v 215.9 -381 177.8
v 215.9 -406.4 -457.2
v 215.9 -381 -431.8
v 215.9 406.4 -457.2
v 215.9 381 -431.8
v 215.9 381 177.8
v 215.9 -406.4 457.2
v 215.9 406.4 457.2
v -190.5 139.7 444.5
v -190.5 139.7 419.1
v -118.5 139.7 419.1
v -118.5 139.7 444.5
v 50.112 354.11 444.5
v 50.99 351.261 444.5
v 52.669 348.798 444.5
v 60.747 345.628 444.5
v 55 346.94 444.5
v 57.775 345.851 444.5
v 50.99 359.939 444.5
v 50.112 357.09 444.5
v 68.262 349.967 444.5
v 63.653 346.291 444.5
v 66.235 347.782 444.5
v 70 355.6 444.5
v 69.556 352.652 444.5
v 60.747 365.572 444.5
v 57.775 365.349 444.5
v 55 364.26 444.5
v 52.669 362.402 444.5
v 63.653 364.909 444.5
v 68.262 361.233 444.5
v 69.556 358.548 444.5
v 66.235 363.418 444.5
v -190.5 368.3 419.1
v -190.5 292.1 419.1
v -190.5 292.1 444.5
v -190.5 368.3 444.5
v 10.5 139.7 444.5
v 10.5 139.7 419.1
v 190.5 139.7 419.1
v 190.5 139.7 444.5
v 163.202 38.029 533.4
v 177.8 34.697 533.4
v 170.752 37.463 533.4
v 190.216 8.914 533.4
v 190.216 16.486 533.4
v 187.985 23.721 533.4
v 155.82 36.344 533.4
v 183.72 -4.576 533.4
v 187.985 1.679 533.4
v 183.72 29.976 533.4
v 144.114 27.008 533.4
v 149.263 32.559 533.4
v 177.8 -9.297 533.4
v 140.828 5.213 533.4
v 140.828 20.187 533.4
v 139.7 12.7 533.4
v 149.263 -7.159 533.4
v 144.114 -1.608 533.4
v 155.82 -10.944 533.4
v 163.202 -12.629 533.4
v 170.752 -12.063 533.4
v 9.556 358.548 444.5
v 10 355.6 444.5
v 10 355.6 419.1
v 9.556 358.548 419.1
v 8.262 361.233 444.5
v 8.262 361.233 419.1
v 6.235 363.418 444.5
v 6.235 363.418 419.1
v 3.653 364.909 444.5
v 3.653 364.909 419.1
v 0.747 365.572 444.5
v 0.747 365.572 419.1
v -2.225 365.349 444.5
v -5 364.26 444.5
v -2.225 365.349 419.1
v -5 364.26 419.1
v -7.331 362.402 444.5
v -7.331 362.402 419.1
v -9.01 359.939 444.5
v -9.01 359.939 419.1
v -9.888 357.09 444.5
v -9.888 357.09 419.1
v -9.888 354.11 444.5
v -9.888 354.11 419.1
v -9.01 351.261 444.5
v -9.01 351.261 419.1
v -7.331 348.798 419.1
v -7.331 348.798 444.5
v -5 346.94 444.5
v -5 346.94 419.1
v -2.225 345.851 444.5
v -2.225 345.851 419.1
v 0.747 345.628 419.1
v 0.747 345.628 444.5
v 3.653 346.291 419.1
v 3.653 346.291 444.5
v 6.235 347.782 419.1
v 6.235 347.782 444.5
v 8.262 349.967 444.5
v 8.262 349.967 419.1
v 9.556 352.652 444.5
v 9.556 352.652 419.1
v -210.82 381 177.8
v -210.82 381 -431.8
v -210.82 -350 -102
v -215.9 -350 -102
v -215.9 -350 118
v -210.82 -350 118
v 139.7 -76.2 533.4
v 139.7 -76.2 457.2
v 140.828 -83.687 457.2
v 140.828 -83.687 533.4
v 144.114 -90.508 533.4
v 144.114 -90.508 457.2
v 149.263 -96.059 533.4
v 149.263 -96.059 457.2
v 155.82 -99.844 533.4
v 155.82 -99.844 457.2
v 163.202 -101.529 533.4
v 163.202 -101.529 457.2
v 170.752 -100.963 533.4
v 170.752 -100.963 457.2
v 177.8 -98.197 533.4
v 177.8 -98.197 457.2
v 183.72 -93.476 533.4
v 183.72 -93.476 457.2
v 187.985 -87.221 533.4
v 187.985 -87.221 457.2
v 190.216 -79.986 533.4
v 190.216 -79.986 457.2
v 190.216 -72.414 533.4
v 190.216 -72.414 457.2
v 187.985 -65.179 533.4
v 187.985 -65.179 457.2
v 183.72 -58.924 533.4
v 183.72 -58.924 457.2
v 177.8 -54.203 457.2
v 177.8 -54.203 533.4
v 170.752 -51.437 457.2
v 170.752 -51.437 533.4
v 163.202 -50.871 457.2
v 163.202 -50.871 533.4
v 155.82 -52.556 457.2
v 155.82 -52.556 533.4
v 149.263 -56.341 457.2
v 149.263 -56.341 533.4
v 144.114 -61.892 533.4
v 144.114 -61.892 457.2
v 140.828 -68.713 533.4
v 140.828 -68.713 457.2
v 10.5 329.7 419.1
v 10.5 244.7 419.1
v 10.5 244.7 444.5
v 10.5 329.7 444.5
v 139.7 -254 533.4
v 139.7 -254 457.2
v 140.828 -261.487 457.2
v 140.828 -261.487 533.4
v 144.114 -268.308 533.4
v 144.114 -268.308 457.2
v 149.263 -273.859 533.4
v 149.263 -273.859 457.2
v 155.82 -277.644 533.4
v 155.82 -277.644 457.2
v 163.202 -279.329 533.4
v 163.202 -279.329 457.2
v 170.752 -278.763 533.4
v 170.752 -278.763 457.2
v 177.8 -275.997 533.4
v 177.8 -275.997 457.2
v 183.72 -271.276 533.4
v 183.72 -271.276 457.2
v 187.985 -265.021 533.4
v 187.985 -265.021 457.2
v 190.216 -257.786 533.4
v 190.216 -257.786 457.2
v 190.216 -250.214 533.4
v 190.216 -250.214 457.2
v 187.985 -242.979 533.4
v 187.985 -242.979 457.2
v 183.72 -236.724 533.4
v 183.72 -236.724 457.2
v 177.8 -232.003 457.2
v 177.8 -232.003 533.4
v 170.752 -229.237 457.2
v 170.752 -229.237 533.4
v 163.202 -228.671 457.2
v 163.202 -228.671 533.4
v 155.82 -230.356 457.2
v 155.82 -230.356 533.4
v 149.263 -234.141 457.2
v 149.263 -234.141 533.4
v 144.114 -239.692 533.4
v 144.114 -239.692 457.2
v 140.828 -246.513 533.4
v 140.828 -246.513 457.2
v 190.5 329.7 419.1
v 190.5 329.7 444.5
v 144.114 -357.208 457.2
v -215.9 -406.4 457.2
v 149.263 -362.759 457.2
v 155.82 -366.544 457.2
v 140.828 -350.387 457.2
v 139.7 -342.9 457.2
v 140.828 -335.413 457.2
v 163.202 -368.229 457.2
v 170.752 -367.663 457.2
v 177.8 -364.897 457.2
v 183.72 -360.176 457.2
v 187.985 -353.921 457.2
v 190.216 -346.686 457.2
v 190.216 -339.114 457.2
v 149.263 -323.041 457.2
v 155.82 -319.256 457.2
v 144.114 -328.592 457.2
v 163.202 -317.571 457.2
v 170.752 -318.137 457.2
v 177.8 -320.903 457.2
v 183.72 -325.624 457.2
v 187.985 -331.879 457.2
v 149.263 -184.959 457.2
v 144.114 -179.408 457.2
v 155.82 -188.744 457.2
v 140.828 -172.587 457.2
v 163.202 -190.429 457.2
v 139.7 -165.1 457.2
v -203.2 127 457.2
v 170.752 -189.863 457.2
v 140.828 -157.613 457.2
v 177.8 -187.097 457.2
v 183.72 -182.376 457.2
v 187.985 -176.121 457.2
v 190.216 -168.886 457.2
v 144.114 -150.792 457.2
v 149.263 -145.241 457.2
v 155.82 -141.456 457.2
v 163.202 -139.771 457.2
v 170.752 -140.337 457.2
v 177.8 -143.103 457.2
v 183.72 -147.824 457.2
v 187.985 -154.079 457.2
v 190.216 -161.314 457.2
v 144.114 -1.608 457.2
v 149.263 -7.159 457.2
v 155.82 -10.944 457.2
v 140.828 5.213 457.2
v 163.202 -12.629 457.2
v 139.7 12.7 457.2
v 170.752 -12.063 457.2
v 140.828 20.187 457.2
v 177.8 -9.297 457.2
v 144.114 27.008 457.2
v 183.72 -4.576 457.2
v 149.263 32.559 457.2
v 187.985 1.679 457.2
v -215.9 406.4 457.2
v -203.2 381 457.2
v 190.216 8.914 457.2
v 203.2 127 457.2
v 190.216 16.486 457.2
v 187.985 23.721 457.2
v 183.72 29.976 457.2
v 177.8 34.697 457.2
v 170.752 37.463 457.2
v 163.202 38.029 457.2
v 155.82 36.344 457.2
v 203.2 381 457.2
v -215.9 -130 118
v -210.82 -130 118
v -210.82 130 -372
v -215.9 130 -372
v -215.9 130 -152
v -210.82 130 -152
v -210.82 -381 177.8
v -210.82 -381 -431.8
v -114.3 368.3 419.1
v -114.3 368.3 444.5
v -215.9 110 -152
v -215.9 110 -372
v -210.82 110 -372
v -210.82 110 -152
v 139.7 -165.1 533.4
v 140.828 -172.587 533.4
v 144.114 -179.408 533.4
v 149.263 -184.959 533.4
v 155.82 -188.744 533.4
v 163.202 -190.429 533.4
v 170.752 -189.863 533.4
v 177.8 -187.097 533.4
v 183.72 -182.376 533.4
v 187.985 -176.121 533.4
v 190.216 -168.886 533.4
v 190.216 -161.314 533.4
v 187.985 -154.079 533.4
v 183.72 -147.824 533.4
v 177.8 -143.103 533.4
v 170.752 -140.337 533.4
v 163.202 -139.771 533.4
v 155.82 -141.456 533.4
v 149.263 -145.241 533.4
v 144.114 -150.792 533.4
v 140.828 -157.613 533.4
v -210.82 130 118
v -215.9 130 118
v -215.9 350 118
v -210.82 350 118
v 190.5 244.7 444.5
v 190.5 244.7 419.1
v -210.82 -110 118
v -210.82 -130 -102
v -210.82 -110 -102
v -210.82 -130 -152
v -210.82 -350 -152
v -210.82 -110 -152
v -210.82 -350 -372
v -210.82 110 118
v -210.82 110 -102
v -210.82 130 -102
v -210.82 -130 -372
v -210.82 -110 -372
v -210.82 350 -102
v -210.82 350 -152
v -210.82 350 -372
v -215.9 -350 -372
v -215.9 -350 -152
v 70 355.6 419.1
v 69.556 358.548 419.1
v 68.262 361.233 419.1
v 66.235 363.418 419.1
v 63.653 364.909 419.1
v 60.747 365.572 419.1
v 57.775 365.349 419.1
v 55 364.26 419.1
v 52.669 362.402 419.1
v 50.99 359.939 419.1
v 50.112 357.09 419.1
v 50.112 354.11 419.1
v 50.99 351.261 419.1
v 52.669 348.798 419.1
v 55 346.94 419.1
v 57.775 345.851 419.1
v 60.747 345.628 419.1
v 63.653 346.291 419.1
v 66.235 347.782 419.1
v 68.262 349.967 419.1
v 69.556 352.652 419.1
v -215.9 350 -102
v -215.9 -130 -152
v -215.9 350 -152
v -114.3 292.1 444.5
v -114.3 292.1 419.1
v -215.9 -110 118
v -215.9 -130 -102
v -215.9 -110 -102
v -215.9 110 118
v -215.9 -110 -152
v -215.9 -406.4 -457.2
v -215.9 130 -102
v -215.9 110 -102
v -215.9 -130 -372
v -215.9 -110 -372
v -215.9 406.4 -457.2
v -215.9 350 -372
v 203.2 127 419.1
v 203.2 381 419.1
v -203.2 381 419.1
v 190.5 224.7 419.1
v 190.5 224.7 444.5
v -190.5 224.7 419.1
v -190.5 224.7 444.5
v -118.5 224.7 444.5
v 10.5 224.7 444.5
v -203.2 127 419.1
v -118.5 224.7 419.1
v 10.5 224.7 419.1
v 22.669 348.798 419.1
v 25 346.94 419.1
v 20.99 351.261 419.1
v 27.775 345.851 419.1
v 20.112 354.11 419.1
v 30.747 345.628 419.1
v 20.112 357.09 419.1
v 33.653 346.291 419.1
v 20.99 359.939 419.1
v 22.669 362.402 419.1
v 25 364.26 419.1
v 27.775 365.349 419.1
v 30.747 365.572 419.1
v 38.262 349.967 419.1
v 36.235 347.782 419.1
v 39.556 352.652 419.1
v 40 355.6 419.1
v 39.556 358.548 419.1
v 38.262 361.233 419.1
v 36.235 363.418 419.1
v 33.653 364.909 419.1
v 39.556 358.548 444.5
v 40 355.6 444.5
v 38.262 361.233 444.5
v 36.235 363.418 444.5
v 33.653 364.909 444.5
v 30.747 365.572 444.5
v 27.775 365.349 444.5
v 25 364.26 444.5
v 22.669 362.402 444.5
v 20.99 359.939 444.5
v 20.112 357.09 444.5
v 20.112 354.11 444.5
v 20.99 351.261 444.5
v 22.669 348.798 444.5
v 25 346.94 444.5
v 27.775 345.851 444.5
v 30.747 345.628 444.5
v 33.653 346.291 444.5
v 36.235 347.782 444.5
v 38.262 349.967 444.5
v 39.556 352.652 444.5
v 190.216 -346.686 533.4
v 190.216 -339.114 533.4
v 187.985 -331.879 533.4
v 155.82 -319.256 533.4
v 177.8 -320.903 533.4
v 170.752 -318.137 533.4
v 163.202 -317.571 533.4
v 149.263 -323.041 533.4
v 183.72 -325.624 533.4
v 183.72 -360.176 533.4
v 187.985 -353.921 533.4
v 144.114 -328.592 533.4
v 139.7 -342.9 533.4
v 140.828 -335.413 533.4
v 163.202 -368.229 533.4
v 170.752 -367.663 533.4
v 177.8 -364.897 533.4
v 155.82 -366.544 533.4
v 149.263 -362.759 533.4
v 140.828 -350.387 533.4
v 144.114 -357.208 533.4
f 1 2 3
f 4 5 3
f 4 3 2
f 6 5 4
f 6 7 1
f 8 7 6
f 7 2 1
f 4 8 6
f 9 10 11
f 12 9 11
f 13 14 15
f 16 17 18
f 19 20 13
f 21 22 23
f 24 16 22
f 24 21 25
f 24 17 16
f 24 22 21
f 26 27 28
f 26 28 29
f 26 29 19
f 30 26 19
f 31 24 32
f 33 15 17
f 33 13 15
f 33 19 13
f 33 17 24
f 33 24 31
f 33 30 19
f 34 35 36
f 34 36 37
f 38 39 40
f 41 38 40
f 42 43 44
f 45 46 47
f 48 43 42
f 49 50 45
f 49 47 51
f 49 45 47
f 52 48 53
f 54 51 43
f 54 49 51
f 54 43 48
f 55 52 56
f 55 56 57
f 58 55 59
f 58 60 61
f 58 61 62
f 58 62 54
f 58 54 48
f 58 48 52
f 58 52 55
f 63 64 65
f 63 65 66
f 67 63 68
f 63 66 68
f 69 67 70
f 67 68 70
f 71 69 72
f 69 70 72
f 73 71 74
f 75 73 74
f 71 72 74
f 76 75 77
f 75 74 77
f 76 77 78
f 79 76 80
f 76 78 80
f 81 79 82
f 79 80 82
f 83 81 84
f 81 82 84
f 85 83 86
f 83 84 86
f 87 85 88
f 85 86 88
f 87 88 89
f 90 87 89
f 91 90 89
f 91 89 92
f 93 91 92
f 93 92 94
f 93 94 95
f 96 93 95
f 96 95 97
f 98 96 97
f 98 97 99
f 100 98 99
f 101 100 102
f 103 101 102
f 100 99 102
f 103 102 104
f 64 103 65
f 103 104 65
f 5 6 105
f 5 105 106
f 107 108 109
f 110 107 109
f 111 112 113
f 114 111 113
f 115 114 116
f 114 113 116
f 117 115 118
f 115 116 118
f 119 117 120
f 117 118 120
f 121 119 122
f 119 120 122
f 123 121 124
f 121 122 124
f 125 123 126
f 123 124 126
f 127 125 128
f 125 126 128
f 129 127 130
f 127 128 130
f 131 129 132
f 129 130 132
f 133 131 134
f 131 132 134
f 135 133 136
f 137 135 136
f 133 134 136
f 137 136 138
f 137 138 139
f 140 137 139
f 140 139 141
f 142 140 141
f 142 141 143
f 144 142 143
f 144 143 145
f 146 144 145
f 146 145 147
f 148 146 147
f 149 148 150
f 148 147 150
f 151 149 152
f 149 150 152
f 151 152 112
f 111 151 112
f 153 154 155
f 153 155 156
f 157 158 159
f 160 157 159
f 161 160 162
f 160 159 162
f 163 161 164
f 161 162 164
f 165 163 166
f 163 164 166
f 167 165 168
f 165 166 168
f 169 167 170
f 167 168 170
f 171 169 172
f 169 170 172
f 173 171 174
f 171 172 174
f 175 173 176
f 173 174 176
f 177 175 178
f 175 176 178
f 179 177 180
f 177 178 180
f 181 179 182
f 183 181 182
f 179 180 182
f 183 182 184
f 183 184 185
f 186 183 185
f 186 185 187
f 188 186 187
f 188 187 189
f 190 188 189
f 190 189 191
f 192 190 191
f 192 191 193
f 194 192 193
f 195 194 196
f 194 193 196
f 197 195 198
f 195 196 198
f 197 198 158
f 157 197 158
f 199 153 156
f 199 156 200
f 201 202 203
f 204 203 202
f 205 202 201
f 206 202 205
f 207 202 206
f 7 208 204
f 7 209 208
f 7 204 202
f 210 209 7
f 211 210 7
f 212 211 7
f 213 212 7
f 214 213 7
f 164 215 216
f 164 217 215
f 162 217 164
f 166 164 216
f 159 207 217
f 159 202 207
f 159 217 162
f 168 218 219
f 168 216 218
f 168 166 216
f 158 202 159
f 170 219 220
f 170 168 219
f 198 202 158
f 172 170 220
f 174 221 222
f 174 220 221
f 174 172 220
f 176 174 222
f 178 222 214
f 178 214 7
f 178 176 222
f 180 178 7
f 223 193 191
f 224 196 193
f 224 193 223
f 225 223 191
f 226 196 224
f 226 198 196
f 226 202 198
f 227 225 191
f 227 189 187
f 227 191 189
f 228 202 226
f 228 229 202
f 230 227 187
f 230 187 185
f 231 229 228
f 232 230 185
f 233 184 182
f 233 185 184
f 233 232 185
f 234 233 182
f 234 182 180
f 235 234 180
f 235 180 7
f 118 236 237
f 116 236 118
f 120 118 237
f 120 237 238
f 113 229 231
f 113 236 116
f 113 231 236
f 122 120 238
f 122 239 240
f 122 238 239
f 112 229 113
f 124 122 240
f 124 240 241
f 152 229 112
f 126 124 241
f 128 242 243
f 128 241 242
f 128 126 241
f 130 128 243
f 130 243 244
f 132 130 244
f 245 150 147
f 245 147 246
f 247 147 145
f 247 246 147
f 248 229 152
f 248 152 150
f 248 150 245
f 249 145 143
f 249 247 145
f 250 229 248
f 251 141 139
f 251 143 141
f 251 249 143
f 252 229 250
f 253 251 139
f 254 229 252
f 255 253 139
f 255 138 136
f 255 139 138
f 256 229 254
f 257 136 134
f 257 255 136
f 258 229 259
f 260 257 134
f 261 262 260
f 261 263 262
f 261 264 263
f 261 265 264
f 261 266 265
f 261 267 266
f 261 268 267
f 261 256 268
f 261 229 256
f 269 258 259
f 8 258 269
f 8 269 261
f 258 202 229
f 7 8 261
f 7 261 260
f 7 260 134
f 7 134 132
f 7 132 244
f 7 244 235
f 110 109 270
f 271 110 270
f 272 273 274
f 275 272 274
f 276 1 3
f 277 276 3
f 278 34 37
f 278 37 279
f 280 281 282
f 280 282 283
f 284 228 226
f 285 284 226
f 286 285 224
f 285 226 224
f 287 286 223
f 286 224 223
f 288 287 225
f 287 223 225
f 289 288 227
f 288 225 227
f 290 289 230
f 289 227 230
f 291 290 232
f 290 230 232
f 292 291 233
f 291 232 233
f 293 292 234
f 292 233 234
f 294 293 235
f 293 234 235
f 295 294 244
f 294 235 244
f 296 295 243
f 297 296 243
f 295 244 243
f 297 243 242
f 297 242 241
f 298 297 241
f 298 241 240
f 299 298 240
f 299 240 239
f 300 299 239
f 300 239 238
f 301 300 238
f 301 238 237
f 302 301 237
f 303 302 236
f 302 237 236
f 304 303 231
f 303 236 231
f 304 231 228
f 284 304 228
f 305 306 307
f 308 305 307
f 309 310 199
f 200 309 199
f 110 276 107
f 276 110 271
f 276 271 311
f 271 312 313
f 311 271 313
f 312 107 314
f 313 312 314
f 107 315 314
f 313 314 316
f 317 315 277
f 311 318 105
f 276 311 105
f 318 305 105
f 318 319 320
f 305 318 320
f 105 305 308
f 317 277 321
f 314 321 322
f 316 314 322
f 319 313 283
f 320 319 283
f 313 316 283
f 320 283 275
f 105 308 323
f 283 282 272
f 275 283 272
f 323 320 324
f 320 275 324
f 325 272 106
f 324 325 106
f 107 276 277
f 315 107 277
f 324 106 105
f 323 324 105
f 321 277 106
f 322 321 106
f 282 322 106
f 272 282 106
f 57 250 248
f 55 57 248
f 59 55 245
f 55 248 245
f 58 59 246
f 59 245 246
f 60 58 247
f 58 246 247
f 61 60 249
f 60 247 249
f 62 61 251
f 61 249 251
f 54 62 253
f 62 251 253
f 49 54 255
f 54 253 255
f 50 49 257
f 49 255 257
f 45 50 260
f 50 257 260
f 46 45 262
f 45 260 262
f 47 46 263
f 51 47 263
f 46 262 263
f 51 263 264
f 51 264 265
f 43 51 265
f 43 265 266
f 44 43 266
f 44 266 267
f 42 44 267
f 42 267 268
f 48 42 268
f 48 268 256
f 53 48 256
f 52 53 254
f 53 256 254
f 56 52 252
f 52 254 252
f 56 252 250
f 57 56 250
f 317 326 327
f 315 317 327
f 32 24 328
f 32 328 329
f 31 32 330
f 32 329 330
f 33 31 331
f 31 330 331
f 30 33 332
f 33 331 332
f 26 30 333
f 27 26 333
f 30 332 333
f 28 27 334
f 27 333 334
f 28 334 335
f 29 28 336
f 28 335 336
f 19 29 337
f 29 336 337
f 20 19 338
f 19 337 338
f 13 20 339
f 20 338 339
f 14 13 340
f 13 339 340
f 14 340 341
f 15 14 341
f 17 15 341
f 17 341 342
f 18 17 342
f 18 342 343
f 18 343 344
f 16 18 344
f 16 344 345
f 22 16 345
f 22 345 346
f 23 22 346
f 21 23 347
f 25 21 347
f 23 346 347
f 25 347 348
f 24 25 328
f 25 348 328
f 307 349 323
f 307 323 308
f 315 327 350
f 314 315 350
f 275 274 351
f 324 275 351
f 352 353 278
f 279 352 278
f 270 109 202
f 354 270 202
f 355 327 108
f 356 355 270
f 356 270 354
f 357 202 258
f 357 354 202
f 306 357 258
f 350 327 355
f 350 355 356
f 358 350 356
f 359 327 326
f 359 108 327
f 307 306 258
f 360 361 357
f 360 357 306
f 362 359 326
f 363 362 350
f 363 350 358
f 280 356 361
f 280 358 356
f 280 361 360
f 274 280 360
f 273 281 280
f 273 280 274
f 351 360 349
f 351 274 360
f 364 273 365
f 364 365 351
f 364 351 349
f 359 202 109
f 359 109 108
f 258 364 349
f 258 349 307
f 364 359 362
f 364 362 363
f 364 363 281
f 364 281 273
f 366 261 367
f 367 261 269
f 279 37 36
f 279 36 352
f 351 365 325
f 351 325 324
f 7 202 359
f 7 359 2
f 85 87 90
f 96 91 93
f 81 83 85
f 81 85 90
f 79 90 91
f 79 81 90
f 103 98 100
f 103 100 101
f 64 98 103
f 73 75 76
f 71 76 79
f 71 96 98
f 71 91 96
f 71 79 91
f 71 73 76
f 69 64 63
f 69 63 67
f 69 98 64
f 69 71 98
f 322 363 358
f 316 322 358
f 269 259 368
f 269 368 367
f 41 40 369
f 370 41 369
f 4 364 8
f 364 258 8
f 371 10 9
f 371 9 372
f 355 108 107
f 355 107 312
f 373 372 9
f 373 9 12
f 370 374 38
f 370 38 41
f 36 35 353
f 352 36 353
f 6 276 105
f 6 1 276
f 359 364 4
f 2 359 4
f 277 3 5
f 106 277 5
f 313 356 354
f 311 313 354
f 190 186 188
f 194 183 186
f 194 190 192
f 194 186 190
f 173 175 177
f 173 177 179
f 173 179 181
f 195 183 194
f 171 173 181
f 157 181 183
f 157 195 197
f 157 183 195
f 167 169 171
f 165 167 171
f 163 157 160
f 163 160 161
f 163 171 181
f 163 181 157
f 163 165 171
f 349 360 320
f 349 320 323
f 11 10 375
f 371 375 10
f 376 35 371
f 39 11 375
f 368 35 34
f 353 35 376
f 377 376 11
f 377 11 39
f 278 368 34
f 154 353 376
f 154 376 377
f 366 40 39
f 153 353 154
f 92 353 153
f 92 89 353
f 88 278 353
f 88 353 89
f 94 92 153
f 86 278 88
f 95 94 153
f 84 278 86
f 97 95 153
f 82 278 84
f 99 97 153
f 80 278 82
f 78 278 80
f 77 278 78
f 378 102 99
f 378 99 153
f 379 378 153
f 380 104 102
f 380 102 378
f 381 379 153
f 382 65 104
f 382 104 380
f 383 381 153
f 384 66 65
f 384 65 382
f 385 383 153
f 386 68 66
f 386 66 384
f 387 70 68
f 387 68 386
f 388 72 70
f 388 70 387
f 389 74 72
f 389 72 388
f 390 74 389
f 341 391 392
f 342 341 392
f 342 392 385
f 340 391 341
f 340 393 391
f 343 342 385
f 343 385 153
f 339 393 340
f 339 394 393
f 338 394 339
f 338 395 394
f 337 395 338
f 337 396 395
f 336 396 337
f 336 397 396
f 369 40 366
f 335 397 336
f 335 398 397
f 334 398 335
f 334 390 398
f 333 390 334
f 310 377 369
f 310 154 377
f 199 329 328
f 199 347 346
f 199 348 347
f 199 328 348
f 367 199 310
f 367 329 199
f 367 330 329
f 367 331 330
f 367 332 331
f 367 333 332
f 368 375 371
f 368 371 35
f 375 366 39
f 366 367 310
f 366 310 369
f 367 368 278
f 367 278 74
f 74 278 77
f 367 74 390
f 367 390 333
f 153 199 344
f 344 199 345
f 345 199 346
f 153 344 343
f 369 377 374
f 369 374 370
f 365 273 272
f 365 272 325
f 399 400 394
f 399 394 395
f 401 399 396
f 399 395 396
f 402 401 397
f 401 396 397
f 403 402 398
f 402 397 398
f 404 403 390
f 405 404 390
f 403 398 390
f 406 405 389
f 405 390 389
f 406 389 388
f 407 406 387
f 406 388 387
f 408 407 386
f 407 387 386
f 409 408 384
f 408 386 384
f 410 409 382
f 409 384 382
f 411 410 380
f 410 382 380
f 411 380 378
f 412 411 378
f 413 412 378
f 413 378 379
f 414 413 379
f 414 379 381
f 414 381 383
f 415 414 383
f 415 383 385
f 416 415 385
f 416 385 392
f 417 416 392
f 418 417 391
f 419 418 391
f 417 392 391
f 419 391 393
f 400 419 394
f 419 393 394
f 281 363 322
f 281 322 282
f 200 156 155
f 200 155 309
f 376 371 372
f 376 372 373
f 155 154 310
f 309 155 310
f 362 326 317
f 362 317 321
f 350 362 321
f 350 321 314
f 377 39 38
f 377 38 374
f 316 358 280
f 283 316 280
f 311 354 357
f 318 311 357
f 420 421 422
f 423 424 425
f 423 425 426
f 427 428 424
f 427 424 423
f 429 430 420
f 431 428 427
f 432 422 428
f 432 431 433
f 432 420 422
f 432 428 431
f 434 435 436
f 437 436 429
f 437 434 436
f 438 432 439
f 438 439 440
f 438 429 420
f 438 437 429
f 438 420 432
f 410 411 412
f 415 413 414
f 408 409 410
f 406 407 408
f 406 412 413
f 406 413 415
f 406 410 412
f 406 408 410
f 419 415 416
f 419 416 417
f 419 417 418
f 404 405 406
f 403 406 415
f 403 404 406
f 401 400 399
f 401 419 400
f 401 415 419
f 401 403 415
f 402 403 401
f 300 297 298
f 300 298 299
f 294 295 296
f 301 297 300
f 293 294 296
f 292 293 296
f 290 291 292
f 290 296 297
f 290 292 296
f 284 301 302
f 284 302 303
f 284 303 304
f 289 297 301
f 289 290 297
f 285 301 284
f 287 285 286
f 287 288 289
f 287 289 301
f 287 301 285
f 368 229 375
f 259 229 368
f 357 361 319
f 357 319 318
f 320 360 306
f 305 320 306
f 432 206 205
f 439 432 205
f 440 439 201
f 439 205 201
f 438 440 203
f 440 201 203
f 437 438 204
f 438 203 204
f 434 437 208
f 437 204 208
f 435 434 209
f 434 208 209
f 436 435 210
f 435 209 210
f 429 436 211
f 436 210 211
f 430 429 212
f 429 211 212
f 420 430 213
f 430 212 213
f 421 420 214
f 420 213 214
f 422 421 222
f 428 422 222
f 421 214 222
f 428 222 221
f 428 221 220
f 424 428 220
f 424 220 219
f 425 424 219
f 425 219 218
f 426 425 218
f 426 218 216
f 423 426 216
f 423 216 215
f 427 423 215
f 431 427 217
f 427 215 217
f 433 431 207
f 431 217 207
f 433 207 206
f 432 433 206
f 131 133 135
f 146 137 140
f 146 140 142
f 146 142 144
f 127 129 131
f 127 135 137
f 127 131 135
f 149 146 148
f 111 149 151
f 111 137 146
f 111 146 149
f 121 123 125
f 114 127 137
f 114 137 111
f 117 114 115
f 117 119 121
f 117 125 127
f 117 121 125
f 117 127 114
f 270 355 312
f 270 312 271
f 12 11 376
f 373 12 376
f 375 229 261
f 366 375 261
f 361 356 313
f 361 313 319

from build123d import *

# Parameters (mm, degrees)
SKETCH2_W           = 431.8
SKETCH2_H           = 812.8
BOSS_EXTRUDE1_DEPTH = 457.2
SKETCH3_W           = 406.4
SKETCH3_H           = 254
CUT_EXTRUDE1_DEPTH  = 38.1
SKETCH3_4_R         = 25.4
BOSS_EXTRUDE2_DEPTH = 76.2
SKETCH5_R           = 10
SKETCH5_W           = 76.2
SKETCH5_H           = 76.2
SKETCH5_W_2         = 180
SKETCH5_H_2         = 85
SKETCH5_W_3         = 72
BOSS_EXTRUDE3_DEPTH = 25.4
SKETCH6_W           = 609.6
SKETCH6_H           = 762
CUT_EXTRUDE2_DEPTH  = 798.57617818
SKETCH7_W           = 5.08
SKETCH7_H           = 762
BOSS_EXTRUDE4_DEPTH = 609.6
SKETCH8_W           = 609.6
SKETCH8_H           = 762
CUT_EXTRUDE3_DEPTH  = 798.57617818
SKETCH9_W           = 5.08
SKETCH9_H           = 762
BOSS_EXTRUDE5_DEPTH = 609.6
SKETCH10_W          = 220
SKETCH10_H          = 220
CUT_EXTRUDE5_DEPTH  = 25.4


with BuildPart() as part:
    # Sketch2 → Boss-Extrude1 (new, symmetric)
    with BuildSketch(Plane.XY):
        Rectangle(SKETCH2_W, SKETCH2_H)
    extrude(amount=BOSS_EXTRUDE1_DEPTH, both=True)

    # Sketch3 → Cut-Extrude1 (cut)
    with BuildSketch(Plane.XY.offset(457.2)):
        with Locations((0, 254)):
            Rectangle(SKETCH3_W, SKETCH3_H)
    extrude(amount=-CUT_EXTRUDE1_DEPTH, mode=Mode.SUBTRACT)

    # Sketch3<4> → Boss-Extrude2 (add)
    with BuildSketch(Plane.XY.offset(457.2)):
        with Locations(Location((165.1, -342.9, 0), (0, 0, 180))):
            Circle(SKETCH3_4_R)
        with Locations(Location((165.1, -254, 0), (0, 0, 180))):
            Circle(SKETCH3_4_R)
        with Locations(Location((165.1, -165.1, 0), (0, 0, 180))):
            Circle(SKETCH3_4_R)
        with Locations(Location((165.1, -76.2, 0), (0, 0, 180))):
            Circle(SKETCH3_4_R)
        with Locations(Location((165.1, 12.7, 0), (0, 0, 180))):
            Circle(SKETCH3_4_R)
    extrude(amount=BOSS_EXTRUDE2_DEPTH)

    # Sketch5 → Boss-Extrude3 (add)
    with BuildSketch(Plane.XY.offset(419.1)):
        with Locations((0, 355.6)):
            Circle(SKETCH5_R)
        with Locations((30, 355.6)):
            Circle(SKETCH5_R)
        with Locations((60, 355.6)):
            Circle(SKETCH5_R)
        with Locations((-152.4, 330.2)):
            Rectangle(SKETCH5_W, SKETCH5_H)
        with Locations((100.5, 182.2)):
            Rectangle(SKETCH5_W_2, SKETCH5_H_2)
        with Locations((100.5, 287.2)):
            Rectangle(SKETCH5_W_2, SKETCH5_H_2)
        with Locations((-154.5, 182.2)):
            Rectangle(SKETCH5_W_3, SKETCH5_H_2)
    extrude(amount=BOSS_EXTRUDE3_DEPTH)

    # Sketch6 → Cut-Extrude2 (cut, through all)
    with BuildSketch(Plane(origin=(215.9, 0, 0), x_dir=(0, 0, -1), z_dir=(1, 0, 0))):
        with Locations((127, 0)):
            Rectangle(SKETCH6_W, SKETCH6_H)
    extrude(amount=-CUT_EXTRUDE2_DEPTH, mode=Mode.SUBTRACT)

    # Sketch7 → Boss-Extrude4 (add)
    with BuildSketch(Plane.XY.offset(-431.8)):
        with Locations((213.36, 0)):
            Rectangle(SKETCH7_W, SKETCH7_H)
    extrude(amount=BOSS_EXTRUDE4_DEPTH)

    # Sketch8 → Cut-Extrude3 (cut, through all)
    with BuildSketch(Plane(origin=(215.9, 0, 0), x_dir=(0, 0, -1), z_dir=(1, 0, 0))):
        with Locations((127, 0)):
            Rectangle(SKETCH8_W, SKETCH8_H)
    extrude(amount=-CUT_EXTRUDE3_DEPTH, mode=Mode.SUBTRACT)

    # Sketch9 → Boss-Extrude5 (add)
    with BuildSketch(Plane.XY.offset(-431.8)):
        with Locations((-213.36, 0)):
            Rectangle(SKETCH9_W, SKETCH9_H)
    extrude(amount=BOSS_EXTRUDE5_DEPTH)

    # Sketch10 → Cut-Extrude5 (cut)
    with BuildSketch(Plane.ZY.offset(215.9)):
        with Locations((-262, 240)):
            Rectangle(SKETCH10_W, SKETCH10_H)
        with Locations((-262, 0)):
            Rectangle(SKETCH10_W, SKETCH10_H)
        with Locations((-262, -240)):
            Rectangle(SKETCH10_W, SKETCH10_H)
        with Locations((8, -240)):
            Rectangle(SKETCH10_W, SKETCH10_H)
        with Locations((8, 240)):
            Rectangle(SKETCH10_W, SKETCH10_H)
        with Locations((8, 0)):
            Rectangle(SKETCH10_W, SKETCH10_H)
    extrude(amount=-CUT_EXTRUDE5_DEPTH, mode=Mode.SUBTRACT)


solid = part.part
